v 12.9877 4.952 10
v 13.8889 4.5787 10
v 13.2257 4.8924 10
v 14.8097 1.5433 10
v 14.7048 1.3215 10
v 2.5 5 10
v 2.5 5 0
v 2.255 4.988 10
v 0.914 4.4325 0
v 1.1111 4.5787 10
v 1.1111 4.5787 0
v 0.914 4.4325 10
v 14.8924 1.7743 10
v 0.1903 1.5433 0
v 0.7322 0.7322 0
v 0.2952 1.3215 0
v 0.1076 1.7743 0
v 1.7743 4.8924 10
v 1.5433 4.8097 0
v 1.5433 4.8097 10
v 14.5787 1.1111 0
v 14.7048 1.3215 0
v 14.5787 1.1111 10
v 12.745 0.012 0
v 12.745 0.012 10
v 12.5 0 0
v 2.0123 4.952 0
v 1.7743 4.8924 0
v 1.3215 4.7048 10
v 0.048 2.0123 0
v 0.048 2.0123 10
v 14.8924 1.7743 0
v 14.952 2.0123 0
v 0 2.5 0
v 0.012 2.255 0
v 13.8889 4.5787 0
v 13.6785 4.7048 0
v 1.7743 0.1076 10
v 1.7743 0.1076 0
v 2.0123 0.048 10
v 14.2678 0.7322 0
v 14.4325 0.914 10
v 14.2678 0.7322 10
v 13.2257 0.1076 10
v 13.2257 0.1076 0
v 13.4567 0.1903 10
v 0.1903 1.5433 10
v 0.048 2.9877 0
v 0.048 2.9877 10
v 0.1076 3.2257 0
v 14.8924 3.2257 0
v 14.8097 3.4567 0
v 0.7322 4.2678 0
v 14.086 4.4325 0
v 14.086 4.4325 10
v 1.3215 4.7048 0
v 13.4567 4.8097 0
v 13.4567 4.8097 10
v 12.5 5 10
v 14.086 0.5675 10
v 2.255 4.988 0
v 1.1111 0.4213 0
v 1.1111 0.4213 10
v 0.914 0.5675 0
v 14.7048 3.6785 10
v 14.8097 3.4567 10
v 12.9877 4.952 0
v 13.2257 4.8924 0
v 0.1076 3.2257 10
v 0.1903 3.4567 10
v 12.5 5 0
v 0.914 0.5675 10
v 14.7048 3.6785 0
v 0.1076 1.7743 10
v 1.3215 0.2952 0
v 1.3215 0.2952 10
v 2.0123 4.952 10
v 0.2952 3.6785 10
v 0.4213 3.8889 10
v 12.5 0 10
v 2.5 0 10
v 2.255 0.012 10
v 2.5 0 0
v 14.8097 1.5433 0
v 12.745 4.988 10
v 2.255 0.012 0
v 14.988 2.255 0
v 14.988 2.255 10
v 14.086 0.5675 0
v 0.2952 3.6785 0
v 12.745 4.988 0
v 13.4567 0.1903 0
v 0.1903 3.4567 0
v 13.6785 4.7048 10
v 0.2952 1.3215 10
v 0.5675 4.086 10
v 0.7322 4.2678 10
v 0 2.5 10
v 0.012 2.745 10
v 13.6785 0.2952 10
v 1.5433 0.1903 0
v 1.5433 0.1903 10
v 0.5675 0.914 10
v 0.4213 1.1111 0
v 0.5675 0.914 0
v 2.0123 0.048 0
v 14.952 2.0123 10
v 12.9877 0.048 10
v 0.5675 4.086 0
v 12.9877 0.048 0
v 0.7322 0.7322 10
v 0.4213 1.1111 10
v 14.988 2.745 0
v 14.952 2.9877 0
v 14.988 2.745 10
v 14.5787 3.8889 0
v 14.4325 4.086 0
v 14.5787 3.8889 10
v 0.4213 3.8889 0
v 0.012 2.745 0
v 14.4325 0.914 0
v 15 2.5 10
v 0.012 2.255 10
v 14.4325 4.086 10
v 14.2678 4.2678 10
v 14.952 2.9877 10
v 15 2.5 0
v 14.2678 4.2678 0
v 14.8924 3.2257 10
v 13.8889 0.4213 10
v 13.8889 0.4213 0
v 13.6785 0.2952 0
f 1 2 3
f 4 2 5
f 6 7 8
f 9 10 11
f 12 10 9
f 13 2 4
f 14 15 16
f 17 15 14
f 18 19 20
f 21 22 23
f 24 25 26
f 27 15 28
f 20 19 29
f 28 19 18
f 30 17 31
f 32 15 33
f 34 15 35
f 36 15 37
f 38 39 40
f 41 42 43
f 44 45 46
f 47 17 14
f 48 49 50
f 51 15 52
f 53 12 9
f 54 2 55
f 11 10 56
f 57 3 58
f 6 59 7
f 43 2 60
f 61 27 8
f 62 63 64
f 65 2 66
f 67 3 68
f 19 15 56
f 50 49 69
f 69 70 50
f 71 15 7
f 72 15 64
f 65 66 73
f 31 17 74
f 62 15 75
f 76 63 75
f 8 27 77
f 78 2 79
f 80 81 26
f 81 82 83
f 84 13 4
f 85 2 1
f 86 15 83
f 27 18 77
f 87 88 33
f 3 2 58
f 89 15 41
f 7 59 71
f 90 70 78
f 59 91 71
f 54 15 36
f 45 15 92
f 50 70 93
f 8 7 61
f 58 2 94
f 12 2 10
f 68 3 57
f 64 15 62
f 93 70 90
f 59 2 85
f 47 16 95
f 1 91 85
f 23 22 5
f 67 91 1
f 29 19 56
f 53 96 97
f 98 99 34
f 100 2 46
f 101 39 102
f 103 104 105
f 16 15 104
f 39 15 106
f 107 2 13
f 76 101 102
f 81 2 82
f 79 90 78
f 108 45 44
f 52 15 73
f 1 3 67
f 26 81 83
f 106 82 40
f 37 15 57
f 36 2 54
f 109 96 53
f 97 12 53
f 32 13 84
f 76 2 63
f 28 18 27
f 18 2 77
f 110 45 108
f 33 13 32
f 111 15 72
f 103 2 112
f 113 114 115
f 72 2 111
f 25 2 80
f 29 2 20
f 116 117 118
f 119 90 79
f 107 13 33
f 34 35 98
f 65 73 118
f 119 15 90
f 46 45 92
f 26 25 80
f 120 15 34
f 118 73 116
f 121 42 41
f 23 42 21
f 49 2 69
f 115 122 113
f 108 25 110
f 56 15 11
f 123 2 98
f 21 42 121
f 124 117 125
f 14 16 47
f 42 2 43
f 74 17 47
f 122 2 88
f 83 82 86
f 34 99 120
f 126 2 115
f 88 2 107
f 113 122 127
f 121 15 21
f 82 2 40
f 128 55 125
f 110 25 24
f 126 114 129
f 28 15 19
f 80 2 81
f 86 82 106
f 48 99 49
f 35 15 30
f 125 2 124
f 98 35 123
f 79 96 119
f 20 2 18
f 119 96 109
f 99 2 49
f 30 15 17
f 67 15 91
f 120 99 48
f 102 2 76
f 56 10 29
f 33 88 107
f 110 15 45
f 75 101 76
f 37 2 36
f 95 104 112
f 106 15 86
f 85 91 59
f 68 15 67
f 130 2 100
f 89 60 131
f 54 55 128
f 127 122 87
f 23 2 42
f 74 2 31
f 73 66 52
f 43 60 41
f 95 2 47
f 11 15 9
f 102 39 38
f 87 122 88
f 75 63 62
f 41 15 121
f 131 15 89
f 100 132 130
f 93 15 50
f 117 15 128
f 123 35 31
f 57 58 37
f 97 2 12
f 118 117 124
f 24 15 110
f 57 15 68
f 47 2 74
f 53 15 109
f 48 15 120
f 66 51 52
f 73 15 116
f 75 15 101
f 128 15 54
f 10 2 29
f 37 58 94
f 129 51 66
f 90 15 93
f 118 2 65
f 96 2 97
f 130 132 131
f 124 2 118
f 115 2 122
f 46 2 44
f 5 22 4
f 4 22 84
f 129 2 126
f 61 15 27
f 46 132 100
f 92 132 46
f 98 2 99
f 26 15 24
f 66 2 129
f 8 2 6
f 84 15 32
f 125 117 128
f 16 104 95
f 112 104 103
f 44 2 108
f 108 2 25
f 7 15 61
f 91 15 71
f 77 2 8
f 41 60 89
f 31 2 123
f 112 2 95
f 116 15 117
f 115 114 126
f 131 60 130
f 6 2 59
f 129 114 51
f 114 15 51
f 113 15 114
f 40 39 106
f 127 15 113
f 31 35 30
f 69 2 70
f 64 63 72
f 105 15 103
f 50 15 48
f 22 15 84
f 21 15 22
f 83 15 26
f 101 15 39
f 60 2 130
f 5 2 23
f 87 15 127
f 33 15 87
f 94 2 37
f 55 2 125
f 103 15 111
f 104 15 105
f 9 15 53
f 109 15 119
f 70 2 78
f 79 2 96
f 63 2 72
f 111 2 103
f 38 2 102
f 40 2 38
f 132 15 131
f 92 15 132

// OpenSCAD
module HullExample(){
  translate([2.5, 2.5, 0])hull(){
      cylinder(d=5,h=10,$fn=64);
      translate([10, 0, 0])cylinder(d=5,h=10,$fn=64);
    }
}
$fn=64;
color("SteelBlue")HullExample();
